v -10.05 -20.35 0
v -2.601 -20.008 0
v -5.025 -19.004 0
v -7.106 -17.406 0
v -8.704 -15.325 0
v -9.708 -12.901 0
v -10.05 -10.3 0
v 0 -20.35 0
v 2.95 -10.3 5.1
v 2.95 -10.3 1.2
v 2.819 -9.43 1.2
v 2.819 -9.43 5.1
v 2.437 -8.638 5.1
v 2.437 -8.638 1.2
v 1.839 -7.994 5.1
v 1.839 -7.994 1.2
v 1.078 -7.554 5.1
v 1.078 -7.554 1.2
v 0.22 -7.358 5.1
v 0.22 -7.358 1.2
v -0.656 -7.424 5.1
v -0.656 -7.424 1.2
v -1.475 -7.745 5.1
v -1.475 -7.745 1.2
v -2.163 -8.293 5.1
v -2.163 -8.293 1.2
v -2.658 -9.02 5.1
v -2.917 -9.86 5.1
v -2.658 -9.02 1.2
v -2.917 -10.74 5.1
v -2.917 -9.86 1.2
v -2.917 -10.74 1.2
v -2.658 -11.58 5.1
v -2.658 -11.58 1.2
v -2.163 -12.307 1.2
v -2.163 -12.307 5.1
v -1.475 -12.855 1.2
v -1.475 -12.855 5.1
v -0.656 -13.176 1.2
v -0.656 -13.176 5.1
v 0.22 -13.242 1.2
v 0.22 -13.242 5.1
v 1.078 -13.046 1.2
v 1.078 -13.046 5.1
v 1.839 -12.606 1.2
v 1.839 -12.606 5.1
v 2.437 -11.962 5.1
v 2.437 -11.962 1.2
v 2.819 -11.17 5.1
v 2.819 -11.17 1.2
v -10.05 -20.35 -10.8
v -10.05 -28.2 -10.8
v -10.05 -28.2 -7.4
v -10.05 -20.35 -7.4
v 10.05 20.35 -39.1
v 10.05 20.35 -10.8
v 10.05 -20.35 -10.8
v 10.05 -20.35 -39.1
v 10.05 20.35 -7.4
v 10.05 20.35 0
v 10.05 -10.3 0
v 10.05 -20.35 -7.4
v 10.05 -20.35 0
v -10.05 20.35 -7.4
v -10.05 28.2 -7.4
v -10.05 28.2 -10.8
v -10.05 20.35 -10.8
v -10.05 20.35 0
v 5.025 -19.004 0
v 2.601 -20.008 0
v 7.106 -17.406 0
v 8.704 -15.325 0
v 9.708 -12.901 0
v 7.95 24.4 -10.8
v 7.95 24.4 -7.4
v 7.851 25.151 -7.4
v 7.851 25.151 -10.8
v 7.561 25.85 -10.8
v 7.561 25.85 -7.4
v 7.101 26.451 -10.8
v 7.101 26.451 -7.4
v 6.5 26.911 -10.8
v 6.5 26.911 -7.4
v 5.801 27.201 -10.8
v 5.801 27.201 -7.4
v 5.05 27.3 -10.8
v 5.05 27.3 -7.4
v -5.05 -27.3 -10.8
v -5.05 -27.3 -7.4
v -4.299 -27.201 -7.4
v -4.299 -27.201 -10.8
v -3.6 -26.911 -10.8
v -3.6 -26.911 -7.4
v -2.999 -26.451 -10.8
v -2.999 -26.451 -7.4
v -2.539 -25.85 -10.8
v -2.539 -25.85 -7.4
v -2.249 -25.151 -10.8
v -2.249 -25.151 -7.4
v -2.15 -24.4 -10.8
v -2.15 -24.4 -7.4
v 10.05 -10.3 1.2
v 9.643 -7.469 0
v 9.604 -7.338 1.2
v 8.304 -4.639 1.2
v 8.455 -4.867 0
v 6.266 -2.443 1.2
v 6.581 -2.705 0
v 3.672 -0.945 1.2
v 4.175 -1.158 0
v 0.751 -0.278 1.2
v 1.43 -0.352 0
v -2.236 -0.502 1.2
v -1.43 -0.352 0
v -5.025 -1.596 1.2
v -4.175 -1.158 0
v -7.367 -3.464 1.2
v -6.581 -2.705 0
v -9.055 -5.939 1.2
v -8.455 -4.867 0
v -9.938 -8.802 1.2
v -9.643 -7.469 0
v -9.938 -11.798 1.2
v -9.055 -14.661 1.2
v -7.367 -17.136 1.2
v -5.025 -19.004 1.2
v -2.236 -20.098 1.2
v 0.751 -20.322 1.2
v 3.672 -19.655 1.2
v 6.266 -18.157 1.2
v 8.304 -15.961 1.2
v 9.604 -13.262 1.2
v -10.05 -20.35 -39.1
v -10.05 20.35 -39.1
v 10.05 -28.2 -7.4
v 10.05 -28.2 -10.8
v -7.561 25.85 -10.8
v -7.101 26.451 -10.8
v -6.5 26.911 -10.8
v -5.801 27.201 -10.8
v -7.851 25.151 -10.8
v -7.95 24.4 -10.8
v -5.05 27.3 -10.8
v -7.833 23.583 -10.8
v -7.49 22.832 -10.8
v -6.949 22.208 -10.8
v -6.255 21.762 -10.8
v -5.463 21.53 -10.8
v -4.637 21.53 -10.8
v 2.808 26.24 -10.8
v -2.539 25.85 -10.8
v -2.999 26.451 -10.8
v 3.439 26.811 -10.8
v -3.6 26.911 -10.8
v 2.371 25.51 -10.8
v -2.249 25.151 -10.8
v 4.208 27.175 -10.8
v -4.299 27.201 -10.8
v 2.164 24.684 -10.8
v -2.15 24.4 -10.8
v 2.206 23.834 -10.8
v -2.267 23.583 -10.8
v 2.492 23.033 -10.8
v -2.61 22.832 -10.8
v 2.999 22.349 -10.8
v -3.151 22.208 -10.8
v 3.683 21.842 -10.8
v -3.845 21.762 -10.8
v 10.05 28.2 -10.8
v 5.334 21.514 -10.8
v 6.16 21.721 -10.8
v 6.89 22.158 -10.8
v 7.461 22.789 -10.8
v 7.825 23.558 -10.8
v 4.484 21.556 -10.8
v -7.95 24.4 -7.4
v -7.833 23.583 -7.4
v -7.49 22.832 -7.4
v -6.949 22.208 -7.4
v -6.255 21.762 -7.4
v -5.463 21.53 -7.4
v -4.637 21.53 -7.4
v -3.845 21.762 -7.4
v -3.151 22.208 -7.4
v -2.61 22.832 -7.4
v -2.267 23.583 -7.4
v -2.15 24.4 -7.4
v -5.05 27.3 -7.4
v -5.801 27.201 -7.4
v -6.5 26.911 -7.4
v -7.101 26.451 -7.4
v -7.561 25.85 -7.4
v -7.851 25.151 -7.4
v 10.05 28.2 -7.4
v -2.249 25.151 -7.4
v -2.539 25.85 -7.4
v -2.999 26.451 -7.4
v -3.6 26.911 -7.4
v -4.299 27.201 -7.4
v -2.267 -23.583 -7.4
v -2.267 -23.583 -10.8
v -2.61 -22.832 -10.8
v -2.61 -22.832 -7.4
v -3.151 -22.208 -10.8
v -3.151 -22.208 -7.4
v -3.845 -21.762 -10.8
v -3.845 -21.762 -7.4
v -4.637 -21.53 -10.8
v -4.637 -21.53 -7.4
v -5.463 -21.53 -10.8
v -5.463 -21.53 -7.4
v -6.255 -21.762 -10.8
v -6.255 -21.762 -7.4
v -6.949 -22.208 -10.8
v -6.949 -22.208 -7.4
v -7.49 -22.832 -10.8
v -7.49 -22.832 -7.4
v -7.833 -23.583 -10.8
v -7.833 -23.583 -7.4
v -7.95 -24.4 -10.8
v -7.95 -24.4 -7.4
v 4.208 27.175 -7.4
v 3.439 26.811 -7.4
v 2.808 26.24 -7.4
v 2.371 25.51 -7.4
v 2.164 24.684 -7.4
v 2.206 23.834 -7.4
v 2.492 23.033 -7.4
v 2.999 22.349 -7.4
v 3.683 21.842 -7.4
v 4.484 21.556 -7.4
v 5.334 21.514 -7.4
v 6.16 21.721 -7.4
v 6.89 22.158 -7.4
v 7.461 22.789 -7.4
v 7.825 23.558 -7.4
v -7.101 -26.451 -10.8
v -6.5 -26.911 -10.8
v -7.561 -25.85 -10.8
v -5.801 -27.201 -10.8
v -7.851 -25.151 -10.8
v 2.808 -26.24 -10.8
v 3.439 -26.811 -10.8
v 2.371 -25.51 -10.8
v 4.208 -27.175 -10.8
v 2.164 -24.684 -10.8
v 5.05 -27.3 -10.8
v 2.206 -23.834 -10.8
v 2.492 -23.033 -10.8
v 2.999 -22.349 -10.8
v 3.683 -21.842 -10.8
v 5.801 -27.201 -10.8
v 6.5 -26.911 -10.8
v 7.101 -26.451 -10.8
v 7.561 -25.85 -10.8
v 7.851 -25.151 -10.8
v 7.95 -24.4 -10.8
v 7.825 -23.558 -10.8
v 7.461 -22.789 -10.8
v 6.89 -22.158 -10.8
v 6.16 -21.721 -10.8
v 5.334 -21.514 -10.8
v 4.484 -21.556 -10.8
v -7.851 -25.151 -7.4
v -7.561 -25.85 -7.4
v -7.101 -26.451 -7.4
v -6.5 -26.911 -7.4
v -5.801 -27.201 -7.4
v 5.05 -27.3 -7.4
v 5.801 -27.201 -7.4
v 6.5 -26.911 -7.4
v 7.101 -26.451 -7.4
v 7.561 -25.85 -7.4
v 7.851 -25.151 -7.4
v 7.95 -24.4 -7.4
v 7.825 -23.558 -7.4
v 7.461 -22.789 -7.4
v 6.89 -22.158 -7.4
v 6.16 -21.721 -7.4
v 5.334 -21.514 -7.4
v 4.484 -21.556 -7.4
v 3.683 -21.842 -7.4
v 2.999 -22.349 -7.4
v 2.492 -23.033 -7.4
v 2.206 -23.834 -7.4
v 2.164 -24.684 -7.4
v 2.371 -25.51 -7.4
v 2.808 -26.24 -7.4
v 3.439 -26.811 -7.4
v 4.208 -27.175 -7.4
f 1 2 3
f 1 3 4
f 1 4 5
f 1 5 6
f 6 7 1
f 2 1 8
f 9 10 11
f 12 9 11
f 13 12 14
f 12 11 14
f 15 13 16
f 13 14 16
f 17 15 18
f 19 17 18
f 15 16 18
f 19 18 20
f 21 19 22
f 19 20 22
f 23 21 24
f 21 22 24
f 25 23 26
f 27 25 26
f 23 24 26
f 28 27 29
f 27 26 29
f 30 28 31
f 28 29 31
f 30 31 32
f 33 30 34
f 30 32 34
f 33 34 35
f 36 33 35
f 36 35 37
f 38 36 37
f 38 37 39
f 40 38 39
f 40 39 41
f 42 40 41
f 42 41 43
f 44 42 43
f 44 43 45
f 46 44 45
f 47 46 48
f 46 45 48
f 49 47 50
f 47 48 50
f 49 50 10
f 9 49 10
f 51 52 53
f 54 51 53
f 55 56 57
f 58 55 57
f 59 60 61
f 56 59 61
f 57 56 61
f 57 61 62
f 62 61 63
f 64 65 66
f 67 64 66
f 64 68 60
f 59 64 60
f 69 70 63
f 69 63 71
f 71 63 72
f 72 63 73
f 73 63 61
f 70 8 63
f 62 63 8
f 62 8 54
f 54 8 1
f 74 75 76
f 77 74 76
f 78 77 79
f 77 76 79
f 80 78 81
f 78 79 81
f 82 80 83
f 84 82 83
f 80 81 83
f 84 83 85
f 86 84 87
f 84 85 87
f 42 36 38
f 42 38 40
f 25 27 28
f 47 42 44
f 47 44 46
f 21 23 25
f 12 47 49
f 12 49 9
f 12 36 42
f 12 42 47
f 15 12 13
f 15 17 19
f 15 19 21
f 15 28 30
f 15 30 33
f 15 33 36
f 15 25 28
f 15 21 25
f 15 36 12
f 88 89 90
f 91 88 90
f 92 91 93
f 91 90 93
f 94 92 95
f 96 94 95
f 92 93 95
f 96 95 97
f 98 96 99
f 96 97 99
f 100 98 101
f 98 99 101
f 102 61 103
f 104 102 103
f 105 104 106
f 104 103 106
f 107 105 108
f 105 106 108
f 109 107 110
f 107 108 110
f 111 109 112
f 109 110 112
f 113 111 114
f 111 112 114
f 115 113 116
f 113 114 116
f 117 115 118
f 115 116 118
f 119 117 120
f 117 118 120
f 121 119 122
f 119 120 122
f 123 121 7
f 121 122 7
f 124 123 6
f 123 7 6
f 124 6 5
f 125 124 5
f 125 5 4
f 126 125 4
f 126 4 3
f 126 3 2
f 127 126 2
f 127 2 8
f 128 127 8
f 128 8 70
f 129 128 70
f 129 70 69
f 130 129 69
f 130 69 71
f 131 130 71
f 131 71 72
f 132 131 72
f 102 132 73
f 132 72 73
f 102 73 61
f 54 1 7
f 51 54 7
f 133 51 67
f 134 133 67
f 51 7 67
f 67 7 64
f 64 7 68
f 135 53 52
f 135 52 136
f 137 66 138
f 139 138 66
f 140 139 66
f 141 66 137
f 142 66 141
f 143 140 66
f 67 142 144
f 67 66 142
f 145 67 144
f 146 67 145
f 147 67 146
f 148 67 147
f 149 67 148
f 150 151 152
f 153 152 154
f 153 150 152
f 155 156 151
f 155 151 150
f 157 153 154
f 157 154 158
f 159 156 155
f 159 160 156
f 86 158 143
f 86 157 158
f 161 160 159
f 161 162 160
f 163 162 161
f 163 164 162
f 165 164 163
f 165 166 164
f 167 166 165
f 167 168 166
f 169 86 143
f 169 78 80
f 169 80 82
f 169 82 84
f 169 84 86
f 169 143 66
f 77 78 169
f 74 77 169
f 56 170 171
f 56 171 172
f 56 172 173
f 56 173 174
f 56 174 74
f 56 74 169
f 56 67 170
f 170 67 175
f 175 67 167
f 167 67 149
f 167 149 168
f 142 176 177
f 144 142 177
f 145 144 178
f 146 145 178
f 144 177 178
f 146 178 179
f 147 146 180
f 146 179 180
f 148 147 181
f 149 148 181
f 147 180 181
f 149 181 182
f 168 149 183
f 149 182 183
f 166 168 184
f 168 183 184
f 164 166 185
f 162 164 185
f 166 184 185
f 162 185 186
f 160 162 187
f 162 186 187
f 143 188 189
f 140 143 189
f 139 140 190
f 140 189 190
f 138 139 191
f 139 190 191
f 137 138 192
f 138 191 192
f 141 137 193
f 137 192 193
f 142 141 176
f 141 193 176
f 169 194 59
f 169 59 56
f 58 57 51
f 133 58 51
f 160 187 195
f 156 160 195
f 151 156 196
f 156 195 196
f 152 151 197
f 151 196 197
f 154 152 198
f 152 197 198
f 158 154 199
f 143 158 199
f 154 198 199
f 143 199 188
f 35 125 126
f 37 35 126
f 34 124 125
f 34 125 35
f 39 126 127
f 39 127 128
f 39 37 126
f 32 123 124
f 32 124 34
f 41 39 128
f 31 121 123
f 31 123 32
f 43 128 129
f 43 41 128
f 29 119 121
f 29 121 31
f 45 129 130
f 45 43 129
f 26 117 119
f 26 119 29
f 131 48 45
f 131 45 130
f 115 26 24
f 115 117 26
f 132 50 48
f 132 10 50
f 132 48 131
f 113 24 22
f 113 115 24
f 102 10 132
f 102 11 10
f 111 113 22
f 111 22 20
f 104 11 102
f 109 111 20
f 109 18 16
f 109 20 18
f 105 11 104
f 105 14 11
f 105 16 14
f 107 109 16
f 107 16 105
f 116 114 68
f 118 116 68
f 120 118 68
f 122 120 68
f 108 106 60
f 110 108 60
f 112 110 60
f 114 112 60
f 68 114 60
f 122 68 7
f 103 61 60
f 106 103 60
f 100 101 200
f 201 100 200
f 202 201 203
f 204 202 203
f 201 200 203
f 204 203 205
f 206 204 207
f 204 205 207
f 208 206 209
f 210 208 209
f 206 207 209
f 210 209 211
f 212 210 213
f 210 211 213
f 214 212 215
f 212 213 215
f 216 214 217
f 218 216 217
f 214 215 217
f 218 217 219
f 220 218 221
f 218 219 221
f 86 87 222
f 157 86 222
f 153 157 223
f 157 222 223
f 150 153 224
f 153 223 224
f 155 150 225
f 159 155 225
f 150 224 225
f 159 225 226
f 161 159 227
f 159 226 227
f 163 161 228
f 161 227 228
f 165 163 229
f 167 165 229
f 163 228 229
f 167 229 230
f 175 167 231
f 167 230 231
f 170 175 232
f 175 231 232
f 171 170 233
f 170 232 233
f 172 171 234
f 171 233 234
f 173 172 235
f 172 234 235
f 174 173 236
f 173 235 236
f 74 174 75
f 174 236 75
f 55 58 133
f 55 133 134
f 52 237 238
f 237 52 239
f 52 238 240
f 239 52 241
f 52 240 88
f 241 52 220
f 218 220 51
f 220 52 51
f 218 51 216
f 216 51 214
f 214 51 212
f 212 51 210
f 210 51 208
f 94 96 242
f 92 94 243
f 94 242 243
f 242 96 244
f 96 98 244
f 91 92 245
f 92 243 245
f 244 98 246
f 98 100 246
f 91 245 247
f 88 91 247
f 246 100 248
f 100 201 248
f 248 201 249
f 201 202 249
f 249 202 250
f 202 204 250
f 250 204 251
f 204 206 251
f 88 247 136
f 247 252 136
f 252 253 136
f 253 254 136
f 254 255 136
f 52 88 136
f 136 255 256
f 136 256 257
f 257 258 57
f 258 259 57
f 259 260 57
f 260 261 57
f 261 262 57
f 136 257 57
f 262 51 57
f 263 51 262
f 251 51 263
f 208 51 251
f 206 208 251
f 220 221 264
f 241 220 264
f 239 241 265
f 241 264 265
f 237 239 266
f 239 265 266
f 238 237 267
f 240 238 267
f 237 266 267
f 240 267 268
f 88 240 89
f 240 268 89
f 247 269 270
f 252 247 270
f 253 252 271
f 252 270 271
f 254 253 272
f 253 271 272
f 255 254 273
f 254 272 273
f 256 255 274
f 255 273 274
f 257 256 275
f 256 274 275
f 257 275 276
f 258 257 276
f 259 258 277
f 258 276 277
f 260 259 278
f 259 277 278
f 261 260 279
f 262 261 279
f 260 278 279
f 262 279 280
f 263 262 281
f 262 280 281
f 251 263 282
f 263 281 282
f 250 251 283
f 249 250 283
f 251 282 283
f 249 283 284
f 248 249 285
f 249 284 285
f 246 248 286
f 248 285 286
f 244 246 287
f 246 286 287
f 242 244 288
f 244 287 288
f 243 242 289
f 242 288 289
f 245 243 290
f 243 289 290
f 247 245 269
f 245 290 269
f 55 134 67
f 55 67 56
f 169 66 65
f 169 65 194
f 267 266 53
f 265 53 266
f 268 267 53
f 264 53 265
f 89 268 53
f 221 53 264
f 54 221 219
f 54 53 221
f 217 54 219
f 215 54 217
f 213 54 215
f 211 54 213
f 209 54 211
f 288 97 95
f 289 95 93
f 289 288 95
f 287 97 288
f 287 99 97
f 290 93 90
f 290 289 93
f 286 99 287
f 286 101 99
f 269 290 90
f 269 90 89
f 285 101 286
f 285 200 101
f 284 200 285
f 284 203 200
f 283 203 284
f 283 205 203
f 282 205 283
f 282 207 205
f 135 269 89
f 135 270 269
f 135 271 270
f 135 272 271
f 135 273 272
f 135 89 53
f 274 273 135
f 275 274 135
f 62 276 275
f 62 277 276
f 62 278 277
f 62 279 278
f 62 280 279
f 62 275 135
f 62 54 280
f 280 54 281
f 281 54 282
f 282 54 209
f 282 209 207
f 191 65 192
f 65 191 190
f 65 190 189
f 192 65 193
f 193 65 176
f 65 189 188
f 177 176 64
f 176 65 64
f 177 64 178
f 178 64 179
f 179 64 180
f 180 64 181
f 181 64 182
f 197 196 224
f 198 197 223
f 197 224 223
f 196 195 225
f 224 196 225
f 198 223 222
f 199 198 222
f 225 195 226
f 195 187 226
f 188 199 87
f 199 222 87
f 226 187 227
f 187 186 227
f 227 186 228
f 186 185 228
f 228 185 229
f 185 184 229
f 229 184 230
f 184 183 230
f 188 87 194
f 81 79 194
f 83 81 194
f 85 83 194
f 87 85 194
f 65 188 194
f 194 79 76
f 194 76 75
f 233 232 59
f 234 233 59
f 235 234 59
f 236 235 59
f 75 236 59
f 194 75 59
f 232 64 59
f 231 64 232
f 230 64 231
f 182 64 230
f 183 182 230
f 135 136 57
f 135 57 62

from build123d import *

# Parameters (mm, degrees)
EXTRUDE_1_DEPTH     = 39.1
SKETCH_7_R          = 10.05
EXTRUDE_2_DEPTH     = 1.2
SKETCH_9_R          = 2.95
EXTRUDE_3_DEPTH     = 3.9
SKETCH_10_W         = 20.1
SKETCH_10_H         = 3.4
EXTRUDE_4_DEPTH     = 7.85
SKETCH_11_W         = 20.1
SKETCH_11_H         = 3.4
EXTRUDE_5_DEPTH     = 7.85
CUT_EXTRUDE_1_REACH = 45.602
CUT_EXTRUDE_2_REACH = 45.602


with BuildPart() as part:
    # Sketch 3D_2 → 凸台-拉伸1 (new body)
    with BuildSketch(Plane(origin=(-10.05, 20.35, 0), x_dir=(0.4428021776174894, -0.8966193347777024, 0), z_dir=(0, 0, 1))):
        Polygon((0, 0), (8.90032377, 18.022048629), (45.392730696, 0), (36.492406925, -18.022048629), align=None)
    extrude(amount=-EXTRUDE_1_DEPTH)

    # 草图7 → 凸台-拉伸2 (add)
    with BuildSketch(Plane.XY):
        with Locations((0, -10.3)):
            Circle(SKETCH_7_R)
    extrude(amount=EXTRUDE_2_DEPTH)

    # 草图9 → 凸台-拉伸3 (add)
    with BuildSketch(Plane.XY.offset(1.2)):
        with Locations((0, -10.3)):
            Circle(SKETCH_9_R)
    extrude(amount=EXTRUDE_3_DEPTH)

    # 草图10 → 凸台-拉伸4 (add)
    with BuildSketch(Plane.XZ.offset(20.35)):
        with Locations((0, -9.1)):
            Rectangle(SKETCH_10_W, SKETCH_10_H)
    extrude(amount=EXTRUDE_4_DEPTH)

    # 草图11 → 凸台-拉伸5 (add)
    with BuildSketch(Plane(origin=(0, 20.35, 0), x_dir=(1, 0, 0), z_dir=(0, 1, 0))):
        with Locations((0, 9.1)):
            Rectangle(SKETCH_11_W, SKETCH_11_H)
    extrude(amount=EXTRUDE_5_DEPTH)

    # 草图13 → 切除-拉伸1 (cut, up to next)
    with BuildSketch(Plane.XY.offset(-7.4), mode=Mode.PRIVATE) as cut_extrude_1_sk1:
        with BuildLine():
            ThreePointArc((-7.95, -24.4), (-7.100609665, -26.450609665), (-5.05, -27.3))
            Line((-5.05, -27.3), (-5.05, -24.4))
            Line((-5.05, -24.4), (-7.95, -24.4))
        make_face()
    cut_extrude_1_tool1 = extrude(cut_extrude_1_sk1.sketch, amount=-CUT_EXTRUDE_1_REACH, mode=Mode.PRIVATE) & part.part
    # 草图13 → 切除-拉伸1 (cut, up to next)
    with BuildSketch(Plane.XY.offset(-7.4), mode=Mode.PRIVATE) as cut_extrude_1_sk2:
        with BuildLine():
            Line((-5.05, -24.4), (-5.05, -27.3))
            ThreePointArc((-5.05, -27.3), (-2.999390335, -26.450609665), (-2.15, -24.4))
            ThreePointArc((-2.15, -24.4), (-5.05, -21.5), (-7.95, -24.4))
            Line((-7.95, -24.4), (-5.05, -24.4))
        make_face()
    cut_extrude_1_tool2 = extrude(cut_extrude_1_sk2.sketch, amount=-CUT_EXTRUDE_1_REACH, mode=Mode.PRIVATE) & part.part
    # 草图13 → 切除-拉伸1 (cut, up to next)
    with BuildSketch(Plane.XY.offset(-7.4), mode=Mode.PRIVATE) as cut_extrude_1_sk3:
        with BuildLine():
            ThreePointArc((-7.95, -24.4), (-7.100609665, -26.450609665), (-5.05, -27.3))
            Line((-5.05, -27.3), (-5.05, -24.4))
            Line((-5.05, -24.4), (-7.95, -24.4))
        make_face()
    cut_extrude_1_tool3 = extrude(cut_extrude_1_sk3.sketch, amount=-CUT_EXTRUDE_1_REACH, mode=Mode.PRIVATE) & part.part
    # 草图13 → 切除-拉伸1 (cut, up to next)
    with BuildSketch(Plane.XY.offset(-7.4), mode=Mode.PRIVATE) as cut_extrude_1_sk4:
        with BuildLine():
            Line((-5.05, -24.4), (-5.05, -27.3))
            ThreePointArc((-5.05, -27.3), (-2.999390335, -26.450609665), (-2.15, -24.4))
            ThreePointArc((-2.15, -24.4), (-5.05, -21.5), (-7.95, -24.4))
            Line((-7.95, -24.4), (-5.05, -24.4))
        make_face()
    cut_extrude_1_tool4 = extrude(cut_extrude_1_sk4.sketch, amount=-CUT_EXTRUDE_1_REACH, mode=Mode.PRIVATE) & part.part
    # 草图13 → 切除-拉伸1 (cut, up to next)
    with BuildSketch(Plane.XY.offset(-7.4), mode=Mode.PRIVATE) as cut_extrude_1_sk5:
        with BuildLine():
            ThreePointArc((7.95, -24.4), (2.999390335, -22.349390335), (5.05, -27.3))
            Line((5.05, -27.3), (5.05, -24.4))
            Line((5.05, -24.4), (7.95, -24.4))
        make_face()
    cut_extrude_1_tool5 = extrude(cut_extrude_1_sk5.sketch, amount=-CUT_EXTRUDE_1_REACH, mode=Mode.PRIVATE) & part.part
    # 草图13 → 切除-拉伸1 (cut, up to next)
    with BuildSketch(Plane.XY.offset(-7.4), mode=Mode.PRIVATE) as cut_extrude_1_sk6:
        with BuildLine():
            Line((5.05, -24.4), (5.05, -27.3))
            ThreePointArc((5.05, -27.3), (7.100609665, -26.450609665), (7.95, -24.4))
            Line((7.95, -24.4), (5.05, -24.4))
        make_face()
    cut_extrude_1_tool6 = extrude(cut_extrude_1_sk6.sketch, amount=-CUT_EXTRUDE_1_REACH, mode=Mode.PRIVATE) & part.part
    # 草图13 → 切除-拉伸1 (cut, up to next)
    with BuildSketch(Plane.XY.offset(-7.4), mode=Mode.PRIVATE) as cut_extrude_1_sk7:
        with BuildLine():
            ThreePointArc((7.95, -24.4), (2.999390335, -22.349390335), (5.05, -27.3))
            Line((5.05, -27.3), (5.05, -24.4))
            Line((5.05, -24.4), (7.95, -24.4))
        make_face()
    cut_extrude_1_tool7 = extrude(cut_extrude_1_sk7.sketch, amount=-CUT_EXTRUDE_1_REACH, mode=Mode.PRIVATE) & part.part
    # 草图13 → 切除-拉伸1 (cut, up to next)
    with BuildSketch(Plane.XY.offset(-7.4), mode=Mode.PRIVATE) as cut_extrude_1_sk8:
        with BuildLine():
            Line((5.05, -24.4), (5.05, -27.3))
            ThreePointArc((5.05, -27.3), (7.100609665, -26.450609665), (7.95, -24.4))
            Line((7.95, -24.4), (5.05, -24.4))
        make_face()
    cut_extrude_1_tool8 = extrude(cut_extrude_1_sk8.sketch, amount=-CUT_EXTRUDE_1_REACH, mode=Mode.PRIVATE) & part.part
    add(cut_extrude_1_tool1.solids().sort_by_distance((-6.280798, -25.630798, -7.4))[0], mode=Mode.SUBTRACT)
    add(cut_extrude_1_tool2.solids().sort_by_distance((-4.639734, -23.989734, -7.4))[0], mode=Mode.SUBTRACT)
    add(cut_extrude_1_tool3.solids().sort_by_distance((-6.280798, -25.630798, -7.4))[0], mode=Mode.SUBTRACT)
    add(cut_extrude_1_tool4.solids().sort_by_distance((-4.639734, -23.989734, -7.4))[0], mode=Mode.SUBTRACT)
    add(cut_extrude_1_tool5.solids().sort_by_distance((4.639734, -23.989734, -7.4))[0], mode=Mode.SUBTRACT)
    add(cut_extrude_1_tool6.solids().sort_by_distance((6.280798, -25.630798, -7.4))[0], mode=Mode.SUBTRACT)
    add(cut_extrude_1_tool7.solids().sort_by_distance((4.639734, -23.989734, -7.4))[0], mode=Mode.SUBTRACT)
    add(cut_extrude_1_tool8.solids().sort_by_distance((6.280798, -25.630798, -7.4))[0], mode=Mode.SUBTRACT)

    # 草图14 → 切除-拉伸2 (cut, up to next)
    with BuildSketch(Plane.XY.offset(-7.4), mode=Mode.PRIVATE) as cut_extrude_2_sk1:
        with BuildLine():
            ThreePointArc((-2.15, 24.4), (-2.999390335, 26.450609665), (-5.05, 27.3))
            Line((-5.05, 27.3), (-5.05, 24.4))
            Line((-5.05, 24.4), (-7.95, 24.4))
            ThreePointArc((-7.95, 24.4), (-5.05, 21.5), (-2.15, 24.4))
        make_face()
    cut_extrude_2_tool1 = extrude(cut_extrude_2_sk1.sketch, amount=-CUT_EXTRUDE_2_REACH, mode=Mode.PRIVATE) & part.part
    # 草图14 → 切除-拉伸2 (cut, up to next)
    with BuildSketch(Plane.XY.offset(-7.4), mode=Mode.PRIVATE) as cut_extrude_2_sk2:
        with BuildLine():
            Line((-5.05, 24.4), (-5.05, 27.3))
            ThreePointArc((-5.05, 27.3), (-7.100609665, 26.450609665), (-7.95, 24.4))
            Line((-7.95, 24.4), (-5.05, 24.4))
        make_face()
    cut_extrude_2_tool2 = extrude(cut_extrude_2_sk2.sketch, amount=-CUT_EXTRUDE_2_REACH, mode=Mode.PRIVATE) & part.part
    # 草图14 → 切除-拉伸2 (cut, up to next)
    with BuildSketch(Plane.XY.offset(-7.4), mode=Mode.PRIVATE) as cut_extrude_2_sk3:
        with BuildLine():
            ThreePointArc((-2.15, 24.4), (-2.999390335, 26.450609665), (-5.05, 27.3))
            Line((-5.05, 27.3), (-5.05, 24.4))
            Line((-5.05, 24.4), (-7.95, 24.4))
            ThreePointArc((-7.95, 24.4), (-5.05, 21.5), (-2.15, 24.4))
        make_face()
    cut_extrude_2_tool3 = extrude(cut_extrude_2_sk3.sketch, amount=-CUT_EXTRUDE_2_REACH, mode=Mode.PRIVATE) & part.part
    # 草图14 → 切除-拉伸2 (cut, up to next)
    with BuildSketch(Plane.XY.offset(-7.4), mode=Mode.PRIVATE) as cut_extrude_2_sk4:
        with BuildLine():
            Line((-5.05, 24.4), (-5.05, 27.3))
            ThreePointArc((-5.05, 27.3), (-7.100609665, 26.450609665), (-7.95, 24.4))
            Line((-7.95, 24.4), (-5.05, 24.4))
        make_face()
    cut_extrude_2_tool4 = extrude(cut_extrude_2_sk4.sketch, amount=-CUT_EXTRUDE_2_REACH, mode=Mode.PRIVATE) & part.part
    # 草图14 → 切除-拉伸2 (cut, up to next)
    with BuildSketch(Plane.XY.offset(-7.4), mode=Mode.PRIVATE) as cut_extrude_2_sk5:
        with BuildLine():
            ThreePointArc((7.95, 24.4), (7.100609665, 26.450609665), (5.05, 27.3))
            Line((5.05, 27.3), (5.05, 24.4))
            Line((5.05, 24.4), (7.95, 24.4))
        make_face()
    cut_extrude_2_tool5 = extrude(cut_extrude_2_sk5.sketch, amount=-CUT_EXTRUDE_2_REACH, mode=Mode.PRIVATE) & part.part
    # 草图14 → 切除-拉伸2 (cut, up to next)
    with BuildSketch(Plane.XY.offset(-7.4), mode=Mode.PRIVATE) as cut_extrude_2_sk6:
        with BuildLine():
            Line((5.05, 24.4), (5.05, 27.3))
            ThreePointArc((5.05, 27.3), (2.999390335, 22.349390335), (7.95, 24.4))
            Line((7.95, 24.4), (5.05, 24.4))
        make_face()
    cut_extrude_2_tool6 = extrude(cut_extrude_2_sk6.sketch, amount=-CUT_EXTRUDE_2_REACH, mode=Mode.PRIVATE) & part.part
    # 草图14 → 切除-拉伸2 (cut, up to next)
    with BuildSketch(Plane.XY.offset(-7.4), mode=Mode.PRIVATE) as cut_extrude_2_sk7:
        with BuildLine():
            ThreePointArc((7.95, 24.4), (7.100609665, 26.450609665), (5.05, 27.3))
            Line((5.05, 27.3), (5.05, 24.4))
            Line((5.05, 24.4), (7.95, 24.4))
        make_face()
    cut_extrude_2_tool7 = extrude(cut_extrude_2_sk7.sketch, amount=-CUT_EXTRUDE_2_REACH, mode=Mode.PRIVATE) & part.part
    # 草图14 → 切除-拉伸2 (cut, up to next)
    with BuildSketch(Plane.XY.offset(-7.4), mode=Mode.PRIVATE) as cut_extrude_2_sk8:
        with BuildLine():
            Line((5.05, 24.4), (5.05, 27.3))
            ThreePointArc((5.05, 27.3), (2.999390335, 22.349390335), (7.95, 24.4))
            Line((7.95, 24.4), (5.05, 24.4))
        make_face()
    cut_extrude_2_tool8 = extrude(cut_extrude_2_sk8.sketch, amount=-CUT_EXTRUDE_2_REACH, mode=Mode.PRIVATE) & part.part
    add(cut_extrude_2_tool1.solids().sort_by_distance((-4.639734, 23.989734, -7.4))[0], mode=Mode.SUBTRACT)
    add(cut_extrude_2_tool2.solids().sort_by_distance((-6.280798, 25.630798, -7.4))[0], mode=Mode.SUBTRACT)
    add(cut_extrude_2_tool3.solids().sort_by_distance((-4.639734, 23.989734, -7.4))[0], mode=Mode.SUBTRACT)
    add(cut_extrude_2_tool4.solids().sort_by_distance((-6.280798, 25.630798, -7.4))[0], mode=Mode.SUBTRACT)
    add(cut_extrude_2_tool5.solids().sort_by_distance((6.280798, 25.630798, -7.4))[0], mode=Mode.SUBTRACT)
    add(cut_extrude_2_tool6.solids().sort_by_distance((4.639734, 23.989734, -7.4))[0], mode=Mode.SUBTRACT)
    add(cut_extrude_2_tool7.solids().sort_by_distance((6.280798, 25.630798, -7.4))[0], mode=Mode.SUBTRACT)
    add(cut_extrude_2_tool8.solids().sort_by_distance((4.639734, 23.989734, -7.4))[0], mode=Mode.SUBTRACT)


solid = part.part
